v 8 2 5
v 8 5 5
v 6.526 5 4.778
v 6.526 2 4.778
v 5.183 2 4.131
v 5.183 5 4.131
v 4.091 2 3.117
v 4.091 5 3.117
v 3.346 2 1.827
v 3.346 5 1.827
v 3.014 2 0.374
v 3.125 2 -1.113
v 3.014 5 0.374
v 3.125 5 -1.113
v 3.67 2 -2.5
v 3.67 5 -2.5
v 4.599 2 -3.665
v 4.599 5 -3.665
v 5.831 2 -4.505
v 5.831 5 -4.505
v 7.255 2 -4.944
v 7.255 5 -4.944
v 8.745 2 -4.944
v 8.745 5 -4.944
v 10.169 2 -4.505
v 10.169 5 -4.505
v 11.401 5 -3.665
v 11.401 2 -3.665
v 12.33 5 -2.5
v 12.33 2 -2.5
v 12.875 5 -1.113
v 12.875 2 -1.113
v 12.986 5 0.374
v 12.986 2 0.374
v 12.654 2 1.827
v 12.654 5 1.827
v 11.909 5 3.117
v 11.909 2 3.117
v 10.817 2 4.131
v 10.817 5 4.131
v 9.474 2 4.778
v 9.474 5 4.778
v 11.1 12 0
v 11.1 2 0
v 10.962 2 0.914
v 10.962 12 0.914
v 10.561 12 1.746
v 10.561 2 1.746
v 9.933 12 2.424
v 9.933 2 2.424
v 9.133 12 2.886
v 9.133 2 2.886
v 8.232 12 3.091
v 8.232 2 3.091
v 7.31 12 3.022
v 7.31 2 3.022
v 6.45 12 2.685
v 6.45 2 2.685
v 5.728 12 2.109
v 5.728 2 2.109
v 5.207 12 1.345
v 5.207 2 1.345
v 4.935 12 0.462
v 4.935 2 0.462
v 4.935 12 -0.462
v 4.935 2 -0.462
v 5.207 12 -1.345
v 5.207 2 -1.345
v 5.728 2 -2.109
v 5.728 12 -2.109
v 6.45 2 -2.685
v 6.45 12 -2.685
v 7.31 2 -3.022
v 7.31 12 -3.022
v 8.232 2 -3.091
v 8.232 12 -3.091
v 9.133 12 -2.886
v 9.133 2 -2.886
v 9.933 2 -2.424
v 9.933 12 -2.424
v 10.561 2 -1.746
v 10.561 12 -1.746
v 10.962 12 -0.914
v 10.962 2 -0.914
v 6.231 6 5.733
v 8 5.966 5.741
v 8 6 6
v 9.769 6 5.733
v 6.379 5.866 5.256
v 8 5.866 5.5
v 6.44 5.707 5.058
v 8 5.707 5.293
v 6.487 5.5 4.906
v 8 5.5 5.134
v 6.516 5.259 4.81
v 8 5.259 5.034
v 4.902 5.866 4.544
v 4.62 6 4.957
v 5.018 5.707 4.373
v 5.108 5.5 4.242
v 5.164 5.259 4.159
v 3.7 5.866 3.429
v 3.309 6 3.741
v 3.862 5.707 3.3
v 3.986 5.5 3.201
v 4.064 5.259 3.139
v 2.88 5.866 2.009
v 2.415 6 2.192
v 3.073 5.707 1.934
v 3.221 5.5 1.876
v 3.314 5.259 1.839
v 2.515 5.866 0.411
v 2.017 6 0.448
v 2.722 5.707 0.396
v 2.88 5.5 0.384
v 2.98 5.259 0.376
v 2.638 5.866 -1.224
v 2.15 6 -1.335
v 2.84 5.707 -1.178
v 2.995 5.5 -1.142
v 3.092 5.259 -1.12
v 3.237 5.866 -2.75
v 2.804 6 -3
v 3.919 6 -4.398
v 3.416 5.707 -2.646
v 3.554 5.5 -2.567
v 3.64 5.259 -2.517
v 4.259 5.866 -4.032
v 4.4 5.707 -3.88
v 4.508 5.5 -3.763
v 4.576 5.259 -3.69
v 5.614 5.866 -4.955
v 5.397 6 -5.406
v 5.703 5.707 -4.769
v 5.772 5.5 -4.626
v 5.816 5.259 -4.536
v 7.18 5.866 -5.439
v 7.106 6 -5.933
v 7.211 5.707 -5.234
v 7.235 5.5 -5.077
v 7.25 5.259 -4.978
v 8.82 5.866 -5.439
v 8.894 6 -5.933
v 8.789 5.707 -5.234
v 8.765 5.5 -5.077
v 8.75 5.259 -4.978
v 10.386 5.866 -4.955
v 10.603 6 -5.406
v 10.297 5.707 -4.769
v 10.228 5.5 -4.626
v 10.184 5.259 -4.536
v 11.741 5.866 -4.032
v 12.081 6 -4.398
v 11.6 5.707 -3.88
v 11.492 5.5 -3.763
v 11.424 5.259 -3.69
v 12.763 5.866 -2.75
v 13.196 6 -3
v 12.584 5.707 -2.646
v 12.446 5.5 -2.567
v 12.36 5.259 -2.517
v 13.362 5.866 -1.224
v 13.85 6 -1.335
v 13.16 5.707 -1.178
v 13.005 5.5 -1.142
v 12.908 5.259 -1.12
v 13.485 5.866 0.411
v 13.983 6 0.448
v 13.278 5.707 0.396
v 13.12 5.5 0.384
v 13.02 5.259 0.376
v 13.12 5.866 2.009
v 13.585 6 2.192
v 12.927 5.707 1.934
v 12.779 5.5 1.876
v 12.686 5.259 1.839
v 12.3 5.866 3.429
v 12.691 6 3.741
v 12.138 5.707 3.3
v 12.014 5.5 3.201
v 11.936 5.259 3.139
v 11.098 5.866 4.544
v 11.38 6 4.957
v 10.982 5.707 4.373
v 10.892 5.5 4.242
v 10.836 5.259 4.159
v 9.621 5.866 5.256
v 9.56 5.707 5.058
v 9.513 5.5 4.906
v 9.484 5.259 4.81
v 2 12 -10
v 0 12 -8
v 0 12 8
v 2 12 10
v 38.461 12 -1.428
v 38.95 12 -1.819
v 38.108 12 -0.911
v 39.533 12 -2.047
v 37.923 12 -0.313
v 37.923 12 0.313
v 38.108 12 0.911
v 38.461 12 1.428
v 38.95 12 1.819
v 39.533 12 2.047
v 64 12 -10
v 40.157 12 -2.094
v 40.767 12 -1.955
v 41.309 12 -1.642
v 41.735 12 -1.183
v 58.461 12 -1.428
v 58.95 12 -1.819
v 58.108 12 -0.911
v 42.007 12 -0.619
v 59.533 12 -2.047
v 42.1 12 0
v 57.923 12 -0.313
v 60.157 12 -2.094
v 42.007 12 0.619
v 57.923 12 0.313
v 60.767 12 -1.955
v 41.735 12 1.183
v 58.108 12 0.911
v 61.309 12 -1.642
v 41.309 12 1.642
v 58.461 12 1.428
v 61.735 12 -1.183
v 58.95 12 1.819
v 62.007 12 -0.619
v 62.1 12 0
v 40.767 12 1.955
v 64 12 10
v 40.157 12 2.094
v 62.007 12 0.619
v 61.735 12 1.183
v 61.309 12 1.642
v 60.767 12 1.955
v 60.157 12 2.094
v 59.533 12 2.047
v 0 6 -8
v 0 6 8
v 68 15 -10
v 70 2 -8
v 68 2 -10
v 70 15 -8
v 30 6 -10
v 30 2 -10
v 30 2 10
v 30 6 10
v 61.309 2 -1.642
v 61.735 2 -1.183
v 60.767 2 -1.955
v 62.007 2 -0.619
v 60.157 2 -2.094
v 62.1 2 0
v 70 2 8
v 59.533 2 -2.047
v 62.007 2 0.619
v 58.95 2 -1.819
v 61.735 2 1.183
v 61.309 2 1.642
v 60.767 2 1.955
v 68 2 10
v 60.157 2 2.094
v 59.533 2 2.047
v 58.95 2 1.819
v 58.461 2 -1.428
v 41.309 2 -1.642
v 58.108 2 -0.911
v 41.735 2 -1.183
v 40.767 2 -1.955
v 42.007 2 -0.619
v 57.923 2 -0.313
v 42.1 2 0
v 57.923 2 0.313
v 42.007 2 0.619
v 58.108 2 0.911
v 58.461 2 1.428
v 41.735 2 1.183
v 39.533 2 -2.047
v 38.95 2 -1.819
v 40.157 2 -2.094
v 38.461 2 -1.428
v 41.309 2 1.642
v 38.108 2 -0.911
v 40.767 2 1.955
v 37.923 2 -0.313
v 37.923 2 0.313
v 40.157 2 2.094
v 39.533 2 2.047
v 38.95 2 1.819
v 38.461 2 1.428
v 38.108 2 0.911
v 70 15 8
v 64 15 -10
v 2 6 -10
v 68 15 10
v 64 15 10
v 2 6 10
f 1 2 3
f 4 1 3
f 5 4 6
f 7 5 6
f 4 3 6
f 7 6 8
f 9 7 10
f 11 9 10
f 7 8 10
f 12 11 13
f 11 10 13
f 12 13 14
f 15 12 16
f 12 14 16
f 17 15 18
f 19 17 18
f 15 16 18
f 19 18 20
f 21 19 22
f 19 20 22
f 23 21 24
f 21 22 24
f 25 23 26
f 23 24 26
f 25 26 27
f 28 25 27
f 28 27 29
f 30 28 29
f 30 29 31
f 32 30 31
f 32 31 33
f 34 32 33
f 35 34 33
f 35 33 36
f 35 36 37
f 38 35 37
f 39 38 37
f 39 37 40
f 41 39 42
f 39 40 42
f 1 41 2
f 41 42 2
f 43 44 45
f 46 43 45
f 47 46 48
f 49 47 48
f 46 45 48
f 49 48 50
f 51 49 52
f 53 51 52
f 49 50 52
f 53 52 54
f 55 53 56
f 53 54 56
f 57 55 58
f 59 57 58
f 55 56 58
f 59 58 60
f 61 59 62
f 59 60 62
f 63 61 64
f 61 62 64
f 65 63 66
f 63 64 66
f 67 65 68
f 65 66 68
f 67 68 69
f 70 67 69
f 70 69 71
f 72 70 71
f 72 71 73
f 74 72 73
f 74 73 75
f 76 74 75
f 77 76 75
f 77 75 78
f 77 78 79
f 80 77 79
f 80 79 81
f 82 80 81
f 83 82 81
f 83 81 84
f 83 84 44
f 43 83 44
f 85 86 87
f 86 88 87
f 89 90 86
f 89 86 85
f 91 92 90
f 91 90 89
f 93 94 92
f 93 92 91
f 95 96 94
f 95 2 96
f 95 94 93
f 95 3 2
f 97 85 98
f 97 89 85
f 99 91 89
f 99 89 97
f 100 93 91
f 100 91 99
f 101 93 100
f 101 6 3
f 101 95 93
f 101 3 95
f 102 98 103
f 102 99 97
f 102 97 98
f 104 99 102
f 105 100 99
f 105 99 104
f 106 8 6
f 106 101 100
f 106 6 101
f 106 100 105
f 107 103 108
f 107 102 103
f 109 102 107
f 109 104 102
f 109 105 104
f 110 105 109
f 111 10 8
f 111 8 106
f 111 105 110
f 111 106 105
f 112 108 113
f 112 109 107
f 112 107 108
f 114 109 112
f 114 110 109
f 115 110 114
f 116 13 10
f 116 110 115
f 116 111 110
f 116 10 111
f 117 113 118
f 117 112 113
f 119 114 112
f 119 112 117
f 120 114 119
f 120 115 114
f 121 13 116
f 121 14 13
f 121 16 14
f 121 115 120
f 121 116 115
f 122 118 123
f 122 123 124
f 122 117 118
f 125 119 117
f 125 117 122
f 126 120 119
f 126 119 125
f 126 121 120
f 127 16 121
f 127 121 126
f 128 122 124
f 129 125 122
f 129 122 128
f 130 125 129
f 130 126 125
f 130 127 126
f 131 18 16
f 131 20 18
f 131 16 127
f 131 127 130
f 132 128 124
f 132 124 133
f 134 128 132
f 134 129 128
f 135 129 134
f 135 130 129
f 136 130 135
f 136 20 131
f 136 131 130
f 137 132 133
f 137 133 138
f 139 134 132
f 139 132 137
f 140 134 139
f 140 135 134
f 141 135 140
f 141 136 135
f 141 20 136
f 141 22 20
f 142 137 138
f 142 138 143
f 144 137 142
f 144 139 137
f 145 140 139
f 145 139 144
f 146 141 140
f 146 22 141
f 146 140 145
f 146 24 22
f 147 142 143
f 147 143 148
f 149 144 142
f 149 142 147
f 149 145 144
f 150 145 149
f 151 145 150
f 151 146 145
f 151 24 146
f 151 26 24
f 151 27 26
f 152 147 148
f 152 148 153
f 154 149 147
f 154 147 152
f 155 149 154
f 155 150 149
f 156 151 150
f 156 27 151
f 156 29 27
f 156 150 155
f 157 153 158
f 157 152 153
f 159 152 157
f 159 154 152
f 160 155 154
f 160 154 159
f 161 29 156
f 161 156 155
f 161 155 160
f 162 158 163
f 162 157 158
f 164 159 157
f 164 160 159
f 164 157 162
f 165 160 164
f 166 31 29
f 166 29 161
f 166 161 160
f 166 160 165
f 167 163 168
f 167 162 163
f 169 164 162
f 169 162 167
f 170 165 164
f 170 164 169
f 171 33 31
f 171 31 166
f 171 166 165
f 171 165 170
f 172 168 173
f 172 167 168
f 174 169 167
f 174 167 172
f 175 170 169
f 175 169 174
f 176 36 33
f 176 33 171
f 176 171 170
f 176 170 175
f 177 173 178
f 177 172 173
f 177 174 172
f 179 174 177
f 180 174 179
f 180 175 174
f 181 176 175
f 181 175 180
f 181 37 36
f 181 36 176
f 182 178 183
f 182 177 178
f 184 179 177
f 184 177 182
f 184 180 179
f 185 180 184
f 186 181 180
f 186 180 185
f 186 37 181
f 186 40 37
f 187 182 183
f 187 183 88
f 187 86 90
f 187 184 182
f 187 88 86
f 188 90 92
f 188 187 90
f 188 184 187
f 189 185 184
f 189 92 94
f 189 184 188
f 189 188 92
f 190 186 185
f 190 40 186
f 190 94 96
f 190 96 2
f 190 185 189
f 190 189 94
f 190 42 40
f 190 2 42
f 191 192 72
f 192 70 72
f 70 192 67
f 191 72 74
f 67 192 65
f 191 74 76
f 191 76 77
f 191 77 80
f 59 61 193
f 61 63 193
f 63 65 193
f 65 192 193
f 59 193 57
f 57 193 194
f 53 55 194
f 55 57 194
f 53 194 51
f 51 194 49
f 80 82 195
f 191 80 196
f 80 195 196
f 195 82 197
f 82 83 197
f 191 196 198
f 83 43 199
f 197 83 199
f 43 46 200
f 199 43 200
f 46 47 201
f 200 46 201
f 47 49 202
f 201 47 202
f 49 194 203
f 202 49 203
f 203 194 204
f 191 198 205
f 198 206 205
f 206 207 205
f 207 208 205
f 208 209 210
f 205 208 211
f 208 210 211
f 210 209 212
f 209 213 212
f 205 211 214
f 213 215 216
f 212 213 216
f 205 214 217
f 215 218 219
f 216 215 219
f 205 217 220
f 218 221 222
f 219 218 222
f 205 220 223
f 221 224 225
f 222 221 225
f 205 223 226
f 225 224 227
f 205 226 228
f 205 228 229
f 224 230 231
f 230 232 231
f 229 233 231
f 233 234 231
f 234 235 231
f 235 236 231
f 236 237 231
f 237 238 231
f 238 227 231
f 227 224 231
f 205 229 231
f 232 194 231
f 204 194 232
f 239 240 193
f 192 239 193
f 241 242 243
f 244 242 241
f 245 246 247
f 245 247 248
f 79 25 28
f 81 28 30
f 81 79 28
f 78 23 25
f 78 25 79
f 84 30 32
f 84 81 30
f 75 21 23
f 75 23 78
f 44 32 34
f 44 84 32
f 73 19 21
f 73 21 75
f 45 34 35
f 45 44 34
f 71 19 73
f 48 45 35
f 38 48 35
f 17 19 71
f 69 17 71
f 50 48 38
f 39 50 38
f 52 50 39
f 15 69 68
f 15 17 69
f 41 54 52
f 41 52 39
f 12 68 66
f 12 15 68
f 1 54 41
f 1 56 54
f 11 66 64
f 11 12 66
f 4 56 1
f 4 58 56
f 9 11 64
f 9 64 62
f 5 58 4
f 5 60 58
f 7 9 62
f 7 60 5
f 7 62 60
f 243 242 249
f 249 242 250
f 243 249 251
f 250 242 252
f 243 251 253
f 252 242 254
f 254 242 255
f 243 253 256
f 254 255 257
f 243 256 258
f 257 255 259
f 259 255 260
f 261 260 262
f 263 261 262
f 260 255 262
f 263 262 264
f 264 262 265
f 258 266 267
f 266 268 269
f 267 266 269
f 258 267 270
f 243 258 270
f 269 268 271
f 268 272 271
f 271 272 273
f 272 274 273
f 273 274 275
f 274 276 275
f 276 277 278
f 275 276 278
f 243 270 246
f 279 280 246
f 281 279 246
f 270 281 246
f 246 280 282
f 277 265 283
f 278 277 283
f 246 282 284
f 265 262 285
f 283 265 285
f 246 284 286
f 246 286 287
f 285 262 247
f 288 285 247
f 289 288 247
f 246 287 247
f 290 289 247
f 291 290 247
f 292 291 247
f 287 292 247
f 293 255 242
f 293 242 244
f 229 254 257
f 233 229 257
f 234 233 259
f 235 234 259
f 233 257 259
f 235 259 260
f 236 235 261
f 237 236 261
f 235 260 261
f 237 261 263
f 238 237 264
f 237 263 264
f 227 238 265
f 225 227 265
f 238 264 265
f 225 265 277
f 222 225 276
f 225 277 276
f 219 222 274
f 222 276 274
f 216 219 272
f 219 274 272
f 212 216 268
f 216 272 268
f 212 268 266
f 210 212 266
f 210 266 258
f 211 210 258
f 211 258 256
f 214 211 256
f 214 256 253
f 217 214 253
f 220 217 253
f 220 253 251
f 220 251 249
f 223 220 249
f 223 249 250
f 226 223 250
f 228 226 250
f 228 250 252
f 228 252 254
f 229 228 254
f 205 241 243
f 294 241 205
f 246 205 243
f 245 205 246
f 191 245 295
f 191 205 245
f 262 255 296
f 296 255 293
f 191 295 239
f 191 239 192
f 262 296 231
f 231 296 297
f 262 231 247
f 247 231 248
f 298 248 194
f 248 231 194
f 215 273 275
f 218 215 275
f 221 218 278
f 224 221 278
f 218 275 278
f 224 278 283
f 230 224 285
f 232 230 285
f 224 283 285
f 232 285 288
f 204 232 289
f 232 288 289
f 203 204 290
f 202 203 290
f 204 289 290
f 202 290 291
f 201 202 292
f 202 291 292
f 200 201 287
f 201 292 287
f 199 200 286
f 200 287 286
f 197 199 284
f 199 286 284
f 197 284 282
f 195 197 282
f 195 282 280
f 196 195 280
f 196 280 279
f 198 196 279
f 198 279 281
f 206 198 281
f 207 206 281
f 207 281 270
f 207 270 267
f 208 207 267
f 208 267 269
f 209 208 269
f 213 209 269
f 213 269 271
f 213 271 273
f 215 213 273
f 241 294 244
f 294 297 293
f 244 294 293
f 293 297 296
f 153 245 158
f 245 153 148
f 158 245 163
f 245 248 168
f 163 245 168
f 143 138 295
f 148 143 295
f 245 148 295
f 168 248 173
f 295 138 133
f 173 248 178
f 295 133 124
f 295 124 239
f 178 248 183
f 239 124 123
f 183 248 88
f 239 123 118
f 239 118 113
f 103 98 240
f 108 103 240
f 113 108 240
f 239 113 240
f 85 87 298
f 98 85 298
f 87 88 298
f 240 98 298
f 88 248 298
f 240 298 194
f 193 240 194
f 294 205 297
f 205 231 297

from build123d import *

# Parameters (mm, degrees)
EXTRUDE_1_DEPTH     = 10
SKETCH_3_R          = 5
EXTRUDE_2_DEPTH     = 4
CHAMFER_1_SIZE      = 2
CHAMFER_2_SIZE      = 2
SKETCH_4_R          = 2.1
SKETCH_4_R_2        = 3.1
CUT_EXTRUDE_1_DEPTH = 72.895757872
FILLET_1_R          = 1


with BuildPart() as part:
    # 草图1 → 凸台-拉伸1 (new, symmetric)
    with BuildSketch(Plane.XY):
        Polygon((0, 6), (0, 12), (64, 12), (64, 15), (70, 15), (70, 12), (70, 2), (30, 2), (30, 6), align=None)
    extrude(amount=EXTRUDE_1_DEPTH, both=True)

    # 草图3 → 凸台-拉伸2 (add)
    with BuildSketch(Plane.XZ.offset(-6)):
        with Locations(Location((8, 0, 0), (0, 0, 90))):
            Circle(SKETCH_3_R)
    extrude(amount=EXTRUDE_2_DEPTH)

    # 倒角1
    chamfer_1_edges = [part.edges().sort_by_distance(p)[0] for p in [
        (0, 9, -10),
        (0, 9, 10),
    ]]
    chamfer(chamfer_1_edges, length=CHAMFER_1_SIZE)

    # 倒角2
    chamfer_2_edges = [part.edges().sort_by_distance(p)[0] for p in [
        (70, 8.5, 10),
        (70, 8.5, -10),
    ]]
    chamfer(chamfer_2_edges, length=CHAMFER_2_SIZE)

    # 草图4 → 切除-拉伸1 (cut, through all)
    with BuildSketch(Plane.XZ.offset(-2)):
        with Locations((40, 0)):
            Circle(SKETCH_4_R)
        with Locations((60, 0)):
            Circle(SKETCH_4_R)
        with Locations((8, 0)):
            Circle(SKETCH_4_R_2)
    extrude(amount=-CUT_EXTRUDE_1_DEPTH, mode=Mode.SUBTRACT)

    # 圆角1
    fillet_1_edges = [part.edges().sort_by_distance(p)[0] for p in [
        (8, 6, -5),
    ]]
    fillet(fillet_1_edges, radius=FILLET_1_R)


solid = part.part
